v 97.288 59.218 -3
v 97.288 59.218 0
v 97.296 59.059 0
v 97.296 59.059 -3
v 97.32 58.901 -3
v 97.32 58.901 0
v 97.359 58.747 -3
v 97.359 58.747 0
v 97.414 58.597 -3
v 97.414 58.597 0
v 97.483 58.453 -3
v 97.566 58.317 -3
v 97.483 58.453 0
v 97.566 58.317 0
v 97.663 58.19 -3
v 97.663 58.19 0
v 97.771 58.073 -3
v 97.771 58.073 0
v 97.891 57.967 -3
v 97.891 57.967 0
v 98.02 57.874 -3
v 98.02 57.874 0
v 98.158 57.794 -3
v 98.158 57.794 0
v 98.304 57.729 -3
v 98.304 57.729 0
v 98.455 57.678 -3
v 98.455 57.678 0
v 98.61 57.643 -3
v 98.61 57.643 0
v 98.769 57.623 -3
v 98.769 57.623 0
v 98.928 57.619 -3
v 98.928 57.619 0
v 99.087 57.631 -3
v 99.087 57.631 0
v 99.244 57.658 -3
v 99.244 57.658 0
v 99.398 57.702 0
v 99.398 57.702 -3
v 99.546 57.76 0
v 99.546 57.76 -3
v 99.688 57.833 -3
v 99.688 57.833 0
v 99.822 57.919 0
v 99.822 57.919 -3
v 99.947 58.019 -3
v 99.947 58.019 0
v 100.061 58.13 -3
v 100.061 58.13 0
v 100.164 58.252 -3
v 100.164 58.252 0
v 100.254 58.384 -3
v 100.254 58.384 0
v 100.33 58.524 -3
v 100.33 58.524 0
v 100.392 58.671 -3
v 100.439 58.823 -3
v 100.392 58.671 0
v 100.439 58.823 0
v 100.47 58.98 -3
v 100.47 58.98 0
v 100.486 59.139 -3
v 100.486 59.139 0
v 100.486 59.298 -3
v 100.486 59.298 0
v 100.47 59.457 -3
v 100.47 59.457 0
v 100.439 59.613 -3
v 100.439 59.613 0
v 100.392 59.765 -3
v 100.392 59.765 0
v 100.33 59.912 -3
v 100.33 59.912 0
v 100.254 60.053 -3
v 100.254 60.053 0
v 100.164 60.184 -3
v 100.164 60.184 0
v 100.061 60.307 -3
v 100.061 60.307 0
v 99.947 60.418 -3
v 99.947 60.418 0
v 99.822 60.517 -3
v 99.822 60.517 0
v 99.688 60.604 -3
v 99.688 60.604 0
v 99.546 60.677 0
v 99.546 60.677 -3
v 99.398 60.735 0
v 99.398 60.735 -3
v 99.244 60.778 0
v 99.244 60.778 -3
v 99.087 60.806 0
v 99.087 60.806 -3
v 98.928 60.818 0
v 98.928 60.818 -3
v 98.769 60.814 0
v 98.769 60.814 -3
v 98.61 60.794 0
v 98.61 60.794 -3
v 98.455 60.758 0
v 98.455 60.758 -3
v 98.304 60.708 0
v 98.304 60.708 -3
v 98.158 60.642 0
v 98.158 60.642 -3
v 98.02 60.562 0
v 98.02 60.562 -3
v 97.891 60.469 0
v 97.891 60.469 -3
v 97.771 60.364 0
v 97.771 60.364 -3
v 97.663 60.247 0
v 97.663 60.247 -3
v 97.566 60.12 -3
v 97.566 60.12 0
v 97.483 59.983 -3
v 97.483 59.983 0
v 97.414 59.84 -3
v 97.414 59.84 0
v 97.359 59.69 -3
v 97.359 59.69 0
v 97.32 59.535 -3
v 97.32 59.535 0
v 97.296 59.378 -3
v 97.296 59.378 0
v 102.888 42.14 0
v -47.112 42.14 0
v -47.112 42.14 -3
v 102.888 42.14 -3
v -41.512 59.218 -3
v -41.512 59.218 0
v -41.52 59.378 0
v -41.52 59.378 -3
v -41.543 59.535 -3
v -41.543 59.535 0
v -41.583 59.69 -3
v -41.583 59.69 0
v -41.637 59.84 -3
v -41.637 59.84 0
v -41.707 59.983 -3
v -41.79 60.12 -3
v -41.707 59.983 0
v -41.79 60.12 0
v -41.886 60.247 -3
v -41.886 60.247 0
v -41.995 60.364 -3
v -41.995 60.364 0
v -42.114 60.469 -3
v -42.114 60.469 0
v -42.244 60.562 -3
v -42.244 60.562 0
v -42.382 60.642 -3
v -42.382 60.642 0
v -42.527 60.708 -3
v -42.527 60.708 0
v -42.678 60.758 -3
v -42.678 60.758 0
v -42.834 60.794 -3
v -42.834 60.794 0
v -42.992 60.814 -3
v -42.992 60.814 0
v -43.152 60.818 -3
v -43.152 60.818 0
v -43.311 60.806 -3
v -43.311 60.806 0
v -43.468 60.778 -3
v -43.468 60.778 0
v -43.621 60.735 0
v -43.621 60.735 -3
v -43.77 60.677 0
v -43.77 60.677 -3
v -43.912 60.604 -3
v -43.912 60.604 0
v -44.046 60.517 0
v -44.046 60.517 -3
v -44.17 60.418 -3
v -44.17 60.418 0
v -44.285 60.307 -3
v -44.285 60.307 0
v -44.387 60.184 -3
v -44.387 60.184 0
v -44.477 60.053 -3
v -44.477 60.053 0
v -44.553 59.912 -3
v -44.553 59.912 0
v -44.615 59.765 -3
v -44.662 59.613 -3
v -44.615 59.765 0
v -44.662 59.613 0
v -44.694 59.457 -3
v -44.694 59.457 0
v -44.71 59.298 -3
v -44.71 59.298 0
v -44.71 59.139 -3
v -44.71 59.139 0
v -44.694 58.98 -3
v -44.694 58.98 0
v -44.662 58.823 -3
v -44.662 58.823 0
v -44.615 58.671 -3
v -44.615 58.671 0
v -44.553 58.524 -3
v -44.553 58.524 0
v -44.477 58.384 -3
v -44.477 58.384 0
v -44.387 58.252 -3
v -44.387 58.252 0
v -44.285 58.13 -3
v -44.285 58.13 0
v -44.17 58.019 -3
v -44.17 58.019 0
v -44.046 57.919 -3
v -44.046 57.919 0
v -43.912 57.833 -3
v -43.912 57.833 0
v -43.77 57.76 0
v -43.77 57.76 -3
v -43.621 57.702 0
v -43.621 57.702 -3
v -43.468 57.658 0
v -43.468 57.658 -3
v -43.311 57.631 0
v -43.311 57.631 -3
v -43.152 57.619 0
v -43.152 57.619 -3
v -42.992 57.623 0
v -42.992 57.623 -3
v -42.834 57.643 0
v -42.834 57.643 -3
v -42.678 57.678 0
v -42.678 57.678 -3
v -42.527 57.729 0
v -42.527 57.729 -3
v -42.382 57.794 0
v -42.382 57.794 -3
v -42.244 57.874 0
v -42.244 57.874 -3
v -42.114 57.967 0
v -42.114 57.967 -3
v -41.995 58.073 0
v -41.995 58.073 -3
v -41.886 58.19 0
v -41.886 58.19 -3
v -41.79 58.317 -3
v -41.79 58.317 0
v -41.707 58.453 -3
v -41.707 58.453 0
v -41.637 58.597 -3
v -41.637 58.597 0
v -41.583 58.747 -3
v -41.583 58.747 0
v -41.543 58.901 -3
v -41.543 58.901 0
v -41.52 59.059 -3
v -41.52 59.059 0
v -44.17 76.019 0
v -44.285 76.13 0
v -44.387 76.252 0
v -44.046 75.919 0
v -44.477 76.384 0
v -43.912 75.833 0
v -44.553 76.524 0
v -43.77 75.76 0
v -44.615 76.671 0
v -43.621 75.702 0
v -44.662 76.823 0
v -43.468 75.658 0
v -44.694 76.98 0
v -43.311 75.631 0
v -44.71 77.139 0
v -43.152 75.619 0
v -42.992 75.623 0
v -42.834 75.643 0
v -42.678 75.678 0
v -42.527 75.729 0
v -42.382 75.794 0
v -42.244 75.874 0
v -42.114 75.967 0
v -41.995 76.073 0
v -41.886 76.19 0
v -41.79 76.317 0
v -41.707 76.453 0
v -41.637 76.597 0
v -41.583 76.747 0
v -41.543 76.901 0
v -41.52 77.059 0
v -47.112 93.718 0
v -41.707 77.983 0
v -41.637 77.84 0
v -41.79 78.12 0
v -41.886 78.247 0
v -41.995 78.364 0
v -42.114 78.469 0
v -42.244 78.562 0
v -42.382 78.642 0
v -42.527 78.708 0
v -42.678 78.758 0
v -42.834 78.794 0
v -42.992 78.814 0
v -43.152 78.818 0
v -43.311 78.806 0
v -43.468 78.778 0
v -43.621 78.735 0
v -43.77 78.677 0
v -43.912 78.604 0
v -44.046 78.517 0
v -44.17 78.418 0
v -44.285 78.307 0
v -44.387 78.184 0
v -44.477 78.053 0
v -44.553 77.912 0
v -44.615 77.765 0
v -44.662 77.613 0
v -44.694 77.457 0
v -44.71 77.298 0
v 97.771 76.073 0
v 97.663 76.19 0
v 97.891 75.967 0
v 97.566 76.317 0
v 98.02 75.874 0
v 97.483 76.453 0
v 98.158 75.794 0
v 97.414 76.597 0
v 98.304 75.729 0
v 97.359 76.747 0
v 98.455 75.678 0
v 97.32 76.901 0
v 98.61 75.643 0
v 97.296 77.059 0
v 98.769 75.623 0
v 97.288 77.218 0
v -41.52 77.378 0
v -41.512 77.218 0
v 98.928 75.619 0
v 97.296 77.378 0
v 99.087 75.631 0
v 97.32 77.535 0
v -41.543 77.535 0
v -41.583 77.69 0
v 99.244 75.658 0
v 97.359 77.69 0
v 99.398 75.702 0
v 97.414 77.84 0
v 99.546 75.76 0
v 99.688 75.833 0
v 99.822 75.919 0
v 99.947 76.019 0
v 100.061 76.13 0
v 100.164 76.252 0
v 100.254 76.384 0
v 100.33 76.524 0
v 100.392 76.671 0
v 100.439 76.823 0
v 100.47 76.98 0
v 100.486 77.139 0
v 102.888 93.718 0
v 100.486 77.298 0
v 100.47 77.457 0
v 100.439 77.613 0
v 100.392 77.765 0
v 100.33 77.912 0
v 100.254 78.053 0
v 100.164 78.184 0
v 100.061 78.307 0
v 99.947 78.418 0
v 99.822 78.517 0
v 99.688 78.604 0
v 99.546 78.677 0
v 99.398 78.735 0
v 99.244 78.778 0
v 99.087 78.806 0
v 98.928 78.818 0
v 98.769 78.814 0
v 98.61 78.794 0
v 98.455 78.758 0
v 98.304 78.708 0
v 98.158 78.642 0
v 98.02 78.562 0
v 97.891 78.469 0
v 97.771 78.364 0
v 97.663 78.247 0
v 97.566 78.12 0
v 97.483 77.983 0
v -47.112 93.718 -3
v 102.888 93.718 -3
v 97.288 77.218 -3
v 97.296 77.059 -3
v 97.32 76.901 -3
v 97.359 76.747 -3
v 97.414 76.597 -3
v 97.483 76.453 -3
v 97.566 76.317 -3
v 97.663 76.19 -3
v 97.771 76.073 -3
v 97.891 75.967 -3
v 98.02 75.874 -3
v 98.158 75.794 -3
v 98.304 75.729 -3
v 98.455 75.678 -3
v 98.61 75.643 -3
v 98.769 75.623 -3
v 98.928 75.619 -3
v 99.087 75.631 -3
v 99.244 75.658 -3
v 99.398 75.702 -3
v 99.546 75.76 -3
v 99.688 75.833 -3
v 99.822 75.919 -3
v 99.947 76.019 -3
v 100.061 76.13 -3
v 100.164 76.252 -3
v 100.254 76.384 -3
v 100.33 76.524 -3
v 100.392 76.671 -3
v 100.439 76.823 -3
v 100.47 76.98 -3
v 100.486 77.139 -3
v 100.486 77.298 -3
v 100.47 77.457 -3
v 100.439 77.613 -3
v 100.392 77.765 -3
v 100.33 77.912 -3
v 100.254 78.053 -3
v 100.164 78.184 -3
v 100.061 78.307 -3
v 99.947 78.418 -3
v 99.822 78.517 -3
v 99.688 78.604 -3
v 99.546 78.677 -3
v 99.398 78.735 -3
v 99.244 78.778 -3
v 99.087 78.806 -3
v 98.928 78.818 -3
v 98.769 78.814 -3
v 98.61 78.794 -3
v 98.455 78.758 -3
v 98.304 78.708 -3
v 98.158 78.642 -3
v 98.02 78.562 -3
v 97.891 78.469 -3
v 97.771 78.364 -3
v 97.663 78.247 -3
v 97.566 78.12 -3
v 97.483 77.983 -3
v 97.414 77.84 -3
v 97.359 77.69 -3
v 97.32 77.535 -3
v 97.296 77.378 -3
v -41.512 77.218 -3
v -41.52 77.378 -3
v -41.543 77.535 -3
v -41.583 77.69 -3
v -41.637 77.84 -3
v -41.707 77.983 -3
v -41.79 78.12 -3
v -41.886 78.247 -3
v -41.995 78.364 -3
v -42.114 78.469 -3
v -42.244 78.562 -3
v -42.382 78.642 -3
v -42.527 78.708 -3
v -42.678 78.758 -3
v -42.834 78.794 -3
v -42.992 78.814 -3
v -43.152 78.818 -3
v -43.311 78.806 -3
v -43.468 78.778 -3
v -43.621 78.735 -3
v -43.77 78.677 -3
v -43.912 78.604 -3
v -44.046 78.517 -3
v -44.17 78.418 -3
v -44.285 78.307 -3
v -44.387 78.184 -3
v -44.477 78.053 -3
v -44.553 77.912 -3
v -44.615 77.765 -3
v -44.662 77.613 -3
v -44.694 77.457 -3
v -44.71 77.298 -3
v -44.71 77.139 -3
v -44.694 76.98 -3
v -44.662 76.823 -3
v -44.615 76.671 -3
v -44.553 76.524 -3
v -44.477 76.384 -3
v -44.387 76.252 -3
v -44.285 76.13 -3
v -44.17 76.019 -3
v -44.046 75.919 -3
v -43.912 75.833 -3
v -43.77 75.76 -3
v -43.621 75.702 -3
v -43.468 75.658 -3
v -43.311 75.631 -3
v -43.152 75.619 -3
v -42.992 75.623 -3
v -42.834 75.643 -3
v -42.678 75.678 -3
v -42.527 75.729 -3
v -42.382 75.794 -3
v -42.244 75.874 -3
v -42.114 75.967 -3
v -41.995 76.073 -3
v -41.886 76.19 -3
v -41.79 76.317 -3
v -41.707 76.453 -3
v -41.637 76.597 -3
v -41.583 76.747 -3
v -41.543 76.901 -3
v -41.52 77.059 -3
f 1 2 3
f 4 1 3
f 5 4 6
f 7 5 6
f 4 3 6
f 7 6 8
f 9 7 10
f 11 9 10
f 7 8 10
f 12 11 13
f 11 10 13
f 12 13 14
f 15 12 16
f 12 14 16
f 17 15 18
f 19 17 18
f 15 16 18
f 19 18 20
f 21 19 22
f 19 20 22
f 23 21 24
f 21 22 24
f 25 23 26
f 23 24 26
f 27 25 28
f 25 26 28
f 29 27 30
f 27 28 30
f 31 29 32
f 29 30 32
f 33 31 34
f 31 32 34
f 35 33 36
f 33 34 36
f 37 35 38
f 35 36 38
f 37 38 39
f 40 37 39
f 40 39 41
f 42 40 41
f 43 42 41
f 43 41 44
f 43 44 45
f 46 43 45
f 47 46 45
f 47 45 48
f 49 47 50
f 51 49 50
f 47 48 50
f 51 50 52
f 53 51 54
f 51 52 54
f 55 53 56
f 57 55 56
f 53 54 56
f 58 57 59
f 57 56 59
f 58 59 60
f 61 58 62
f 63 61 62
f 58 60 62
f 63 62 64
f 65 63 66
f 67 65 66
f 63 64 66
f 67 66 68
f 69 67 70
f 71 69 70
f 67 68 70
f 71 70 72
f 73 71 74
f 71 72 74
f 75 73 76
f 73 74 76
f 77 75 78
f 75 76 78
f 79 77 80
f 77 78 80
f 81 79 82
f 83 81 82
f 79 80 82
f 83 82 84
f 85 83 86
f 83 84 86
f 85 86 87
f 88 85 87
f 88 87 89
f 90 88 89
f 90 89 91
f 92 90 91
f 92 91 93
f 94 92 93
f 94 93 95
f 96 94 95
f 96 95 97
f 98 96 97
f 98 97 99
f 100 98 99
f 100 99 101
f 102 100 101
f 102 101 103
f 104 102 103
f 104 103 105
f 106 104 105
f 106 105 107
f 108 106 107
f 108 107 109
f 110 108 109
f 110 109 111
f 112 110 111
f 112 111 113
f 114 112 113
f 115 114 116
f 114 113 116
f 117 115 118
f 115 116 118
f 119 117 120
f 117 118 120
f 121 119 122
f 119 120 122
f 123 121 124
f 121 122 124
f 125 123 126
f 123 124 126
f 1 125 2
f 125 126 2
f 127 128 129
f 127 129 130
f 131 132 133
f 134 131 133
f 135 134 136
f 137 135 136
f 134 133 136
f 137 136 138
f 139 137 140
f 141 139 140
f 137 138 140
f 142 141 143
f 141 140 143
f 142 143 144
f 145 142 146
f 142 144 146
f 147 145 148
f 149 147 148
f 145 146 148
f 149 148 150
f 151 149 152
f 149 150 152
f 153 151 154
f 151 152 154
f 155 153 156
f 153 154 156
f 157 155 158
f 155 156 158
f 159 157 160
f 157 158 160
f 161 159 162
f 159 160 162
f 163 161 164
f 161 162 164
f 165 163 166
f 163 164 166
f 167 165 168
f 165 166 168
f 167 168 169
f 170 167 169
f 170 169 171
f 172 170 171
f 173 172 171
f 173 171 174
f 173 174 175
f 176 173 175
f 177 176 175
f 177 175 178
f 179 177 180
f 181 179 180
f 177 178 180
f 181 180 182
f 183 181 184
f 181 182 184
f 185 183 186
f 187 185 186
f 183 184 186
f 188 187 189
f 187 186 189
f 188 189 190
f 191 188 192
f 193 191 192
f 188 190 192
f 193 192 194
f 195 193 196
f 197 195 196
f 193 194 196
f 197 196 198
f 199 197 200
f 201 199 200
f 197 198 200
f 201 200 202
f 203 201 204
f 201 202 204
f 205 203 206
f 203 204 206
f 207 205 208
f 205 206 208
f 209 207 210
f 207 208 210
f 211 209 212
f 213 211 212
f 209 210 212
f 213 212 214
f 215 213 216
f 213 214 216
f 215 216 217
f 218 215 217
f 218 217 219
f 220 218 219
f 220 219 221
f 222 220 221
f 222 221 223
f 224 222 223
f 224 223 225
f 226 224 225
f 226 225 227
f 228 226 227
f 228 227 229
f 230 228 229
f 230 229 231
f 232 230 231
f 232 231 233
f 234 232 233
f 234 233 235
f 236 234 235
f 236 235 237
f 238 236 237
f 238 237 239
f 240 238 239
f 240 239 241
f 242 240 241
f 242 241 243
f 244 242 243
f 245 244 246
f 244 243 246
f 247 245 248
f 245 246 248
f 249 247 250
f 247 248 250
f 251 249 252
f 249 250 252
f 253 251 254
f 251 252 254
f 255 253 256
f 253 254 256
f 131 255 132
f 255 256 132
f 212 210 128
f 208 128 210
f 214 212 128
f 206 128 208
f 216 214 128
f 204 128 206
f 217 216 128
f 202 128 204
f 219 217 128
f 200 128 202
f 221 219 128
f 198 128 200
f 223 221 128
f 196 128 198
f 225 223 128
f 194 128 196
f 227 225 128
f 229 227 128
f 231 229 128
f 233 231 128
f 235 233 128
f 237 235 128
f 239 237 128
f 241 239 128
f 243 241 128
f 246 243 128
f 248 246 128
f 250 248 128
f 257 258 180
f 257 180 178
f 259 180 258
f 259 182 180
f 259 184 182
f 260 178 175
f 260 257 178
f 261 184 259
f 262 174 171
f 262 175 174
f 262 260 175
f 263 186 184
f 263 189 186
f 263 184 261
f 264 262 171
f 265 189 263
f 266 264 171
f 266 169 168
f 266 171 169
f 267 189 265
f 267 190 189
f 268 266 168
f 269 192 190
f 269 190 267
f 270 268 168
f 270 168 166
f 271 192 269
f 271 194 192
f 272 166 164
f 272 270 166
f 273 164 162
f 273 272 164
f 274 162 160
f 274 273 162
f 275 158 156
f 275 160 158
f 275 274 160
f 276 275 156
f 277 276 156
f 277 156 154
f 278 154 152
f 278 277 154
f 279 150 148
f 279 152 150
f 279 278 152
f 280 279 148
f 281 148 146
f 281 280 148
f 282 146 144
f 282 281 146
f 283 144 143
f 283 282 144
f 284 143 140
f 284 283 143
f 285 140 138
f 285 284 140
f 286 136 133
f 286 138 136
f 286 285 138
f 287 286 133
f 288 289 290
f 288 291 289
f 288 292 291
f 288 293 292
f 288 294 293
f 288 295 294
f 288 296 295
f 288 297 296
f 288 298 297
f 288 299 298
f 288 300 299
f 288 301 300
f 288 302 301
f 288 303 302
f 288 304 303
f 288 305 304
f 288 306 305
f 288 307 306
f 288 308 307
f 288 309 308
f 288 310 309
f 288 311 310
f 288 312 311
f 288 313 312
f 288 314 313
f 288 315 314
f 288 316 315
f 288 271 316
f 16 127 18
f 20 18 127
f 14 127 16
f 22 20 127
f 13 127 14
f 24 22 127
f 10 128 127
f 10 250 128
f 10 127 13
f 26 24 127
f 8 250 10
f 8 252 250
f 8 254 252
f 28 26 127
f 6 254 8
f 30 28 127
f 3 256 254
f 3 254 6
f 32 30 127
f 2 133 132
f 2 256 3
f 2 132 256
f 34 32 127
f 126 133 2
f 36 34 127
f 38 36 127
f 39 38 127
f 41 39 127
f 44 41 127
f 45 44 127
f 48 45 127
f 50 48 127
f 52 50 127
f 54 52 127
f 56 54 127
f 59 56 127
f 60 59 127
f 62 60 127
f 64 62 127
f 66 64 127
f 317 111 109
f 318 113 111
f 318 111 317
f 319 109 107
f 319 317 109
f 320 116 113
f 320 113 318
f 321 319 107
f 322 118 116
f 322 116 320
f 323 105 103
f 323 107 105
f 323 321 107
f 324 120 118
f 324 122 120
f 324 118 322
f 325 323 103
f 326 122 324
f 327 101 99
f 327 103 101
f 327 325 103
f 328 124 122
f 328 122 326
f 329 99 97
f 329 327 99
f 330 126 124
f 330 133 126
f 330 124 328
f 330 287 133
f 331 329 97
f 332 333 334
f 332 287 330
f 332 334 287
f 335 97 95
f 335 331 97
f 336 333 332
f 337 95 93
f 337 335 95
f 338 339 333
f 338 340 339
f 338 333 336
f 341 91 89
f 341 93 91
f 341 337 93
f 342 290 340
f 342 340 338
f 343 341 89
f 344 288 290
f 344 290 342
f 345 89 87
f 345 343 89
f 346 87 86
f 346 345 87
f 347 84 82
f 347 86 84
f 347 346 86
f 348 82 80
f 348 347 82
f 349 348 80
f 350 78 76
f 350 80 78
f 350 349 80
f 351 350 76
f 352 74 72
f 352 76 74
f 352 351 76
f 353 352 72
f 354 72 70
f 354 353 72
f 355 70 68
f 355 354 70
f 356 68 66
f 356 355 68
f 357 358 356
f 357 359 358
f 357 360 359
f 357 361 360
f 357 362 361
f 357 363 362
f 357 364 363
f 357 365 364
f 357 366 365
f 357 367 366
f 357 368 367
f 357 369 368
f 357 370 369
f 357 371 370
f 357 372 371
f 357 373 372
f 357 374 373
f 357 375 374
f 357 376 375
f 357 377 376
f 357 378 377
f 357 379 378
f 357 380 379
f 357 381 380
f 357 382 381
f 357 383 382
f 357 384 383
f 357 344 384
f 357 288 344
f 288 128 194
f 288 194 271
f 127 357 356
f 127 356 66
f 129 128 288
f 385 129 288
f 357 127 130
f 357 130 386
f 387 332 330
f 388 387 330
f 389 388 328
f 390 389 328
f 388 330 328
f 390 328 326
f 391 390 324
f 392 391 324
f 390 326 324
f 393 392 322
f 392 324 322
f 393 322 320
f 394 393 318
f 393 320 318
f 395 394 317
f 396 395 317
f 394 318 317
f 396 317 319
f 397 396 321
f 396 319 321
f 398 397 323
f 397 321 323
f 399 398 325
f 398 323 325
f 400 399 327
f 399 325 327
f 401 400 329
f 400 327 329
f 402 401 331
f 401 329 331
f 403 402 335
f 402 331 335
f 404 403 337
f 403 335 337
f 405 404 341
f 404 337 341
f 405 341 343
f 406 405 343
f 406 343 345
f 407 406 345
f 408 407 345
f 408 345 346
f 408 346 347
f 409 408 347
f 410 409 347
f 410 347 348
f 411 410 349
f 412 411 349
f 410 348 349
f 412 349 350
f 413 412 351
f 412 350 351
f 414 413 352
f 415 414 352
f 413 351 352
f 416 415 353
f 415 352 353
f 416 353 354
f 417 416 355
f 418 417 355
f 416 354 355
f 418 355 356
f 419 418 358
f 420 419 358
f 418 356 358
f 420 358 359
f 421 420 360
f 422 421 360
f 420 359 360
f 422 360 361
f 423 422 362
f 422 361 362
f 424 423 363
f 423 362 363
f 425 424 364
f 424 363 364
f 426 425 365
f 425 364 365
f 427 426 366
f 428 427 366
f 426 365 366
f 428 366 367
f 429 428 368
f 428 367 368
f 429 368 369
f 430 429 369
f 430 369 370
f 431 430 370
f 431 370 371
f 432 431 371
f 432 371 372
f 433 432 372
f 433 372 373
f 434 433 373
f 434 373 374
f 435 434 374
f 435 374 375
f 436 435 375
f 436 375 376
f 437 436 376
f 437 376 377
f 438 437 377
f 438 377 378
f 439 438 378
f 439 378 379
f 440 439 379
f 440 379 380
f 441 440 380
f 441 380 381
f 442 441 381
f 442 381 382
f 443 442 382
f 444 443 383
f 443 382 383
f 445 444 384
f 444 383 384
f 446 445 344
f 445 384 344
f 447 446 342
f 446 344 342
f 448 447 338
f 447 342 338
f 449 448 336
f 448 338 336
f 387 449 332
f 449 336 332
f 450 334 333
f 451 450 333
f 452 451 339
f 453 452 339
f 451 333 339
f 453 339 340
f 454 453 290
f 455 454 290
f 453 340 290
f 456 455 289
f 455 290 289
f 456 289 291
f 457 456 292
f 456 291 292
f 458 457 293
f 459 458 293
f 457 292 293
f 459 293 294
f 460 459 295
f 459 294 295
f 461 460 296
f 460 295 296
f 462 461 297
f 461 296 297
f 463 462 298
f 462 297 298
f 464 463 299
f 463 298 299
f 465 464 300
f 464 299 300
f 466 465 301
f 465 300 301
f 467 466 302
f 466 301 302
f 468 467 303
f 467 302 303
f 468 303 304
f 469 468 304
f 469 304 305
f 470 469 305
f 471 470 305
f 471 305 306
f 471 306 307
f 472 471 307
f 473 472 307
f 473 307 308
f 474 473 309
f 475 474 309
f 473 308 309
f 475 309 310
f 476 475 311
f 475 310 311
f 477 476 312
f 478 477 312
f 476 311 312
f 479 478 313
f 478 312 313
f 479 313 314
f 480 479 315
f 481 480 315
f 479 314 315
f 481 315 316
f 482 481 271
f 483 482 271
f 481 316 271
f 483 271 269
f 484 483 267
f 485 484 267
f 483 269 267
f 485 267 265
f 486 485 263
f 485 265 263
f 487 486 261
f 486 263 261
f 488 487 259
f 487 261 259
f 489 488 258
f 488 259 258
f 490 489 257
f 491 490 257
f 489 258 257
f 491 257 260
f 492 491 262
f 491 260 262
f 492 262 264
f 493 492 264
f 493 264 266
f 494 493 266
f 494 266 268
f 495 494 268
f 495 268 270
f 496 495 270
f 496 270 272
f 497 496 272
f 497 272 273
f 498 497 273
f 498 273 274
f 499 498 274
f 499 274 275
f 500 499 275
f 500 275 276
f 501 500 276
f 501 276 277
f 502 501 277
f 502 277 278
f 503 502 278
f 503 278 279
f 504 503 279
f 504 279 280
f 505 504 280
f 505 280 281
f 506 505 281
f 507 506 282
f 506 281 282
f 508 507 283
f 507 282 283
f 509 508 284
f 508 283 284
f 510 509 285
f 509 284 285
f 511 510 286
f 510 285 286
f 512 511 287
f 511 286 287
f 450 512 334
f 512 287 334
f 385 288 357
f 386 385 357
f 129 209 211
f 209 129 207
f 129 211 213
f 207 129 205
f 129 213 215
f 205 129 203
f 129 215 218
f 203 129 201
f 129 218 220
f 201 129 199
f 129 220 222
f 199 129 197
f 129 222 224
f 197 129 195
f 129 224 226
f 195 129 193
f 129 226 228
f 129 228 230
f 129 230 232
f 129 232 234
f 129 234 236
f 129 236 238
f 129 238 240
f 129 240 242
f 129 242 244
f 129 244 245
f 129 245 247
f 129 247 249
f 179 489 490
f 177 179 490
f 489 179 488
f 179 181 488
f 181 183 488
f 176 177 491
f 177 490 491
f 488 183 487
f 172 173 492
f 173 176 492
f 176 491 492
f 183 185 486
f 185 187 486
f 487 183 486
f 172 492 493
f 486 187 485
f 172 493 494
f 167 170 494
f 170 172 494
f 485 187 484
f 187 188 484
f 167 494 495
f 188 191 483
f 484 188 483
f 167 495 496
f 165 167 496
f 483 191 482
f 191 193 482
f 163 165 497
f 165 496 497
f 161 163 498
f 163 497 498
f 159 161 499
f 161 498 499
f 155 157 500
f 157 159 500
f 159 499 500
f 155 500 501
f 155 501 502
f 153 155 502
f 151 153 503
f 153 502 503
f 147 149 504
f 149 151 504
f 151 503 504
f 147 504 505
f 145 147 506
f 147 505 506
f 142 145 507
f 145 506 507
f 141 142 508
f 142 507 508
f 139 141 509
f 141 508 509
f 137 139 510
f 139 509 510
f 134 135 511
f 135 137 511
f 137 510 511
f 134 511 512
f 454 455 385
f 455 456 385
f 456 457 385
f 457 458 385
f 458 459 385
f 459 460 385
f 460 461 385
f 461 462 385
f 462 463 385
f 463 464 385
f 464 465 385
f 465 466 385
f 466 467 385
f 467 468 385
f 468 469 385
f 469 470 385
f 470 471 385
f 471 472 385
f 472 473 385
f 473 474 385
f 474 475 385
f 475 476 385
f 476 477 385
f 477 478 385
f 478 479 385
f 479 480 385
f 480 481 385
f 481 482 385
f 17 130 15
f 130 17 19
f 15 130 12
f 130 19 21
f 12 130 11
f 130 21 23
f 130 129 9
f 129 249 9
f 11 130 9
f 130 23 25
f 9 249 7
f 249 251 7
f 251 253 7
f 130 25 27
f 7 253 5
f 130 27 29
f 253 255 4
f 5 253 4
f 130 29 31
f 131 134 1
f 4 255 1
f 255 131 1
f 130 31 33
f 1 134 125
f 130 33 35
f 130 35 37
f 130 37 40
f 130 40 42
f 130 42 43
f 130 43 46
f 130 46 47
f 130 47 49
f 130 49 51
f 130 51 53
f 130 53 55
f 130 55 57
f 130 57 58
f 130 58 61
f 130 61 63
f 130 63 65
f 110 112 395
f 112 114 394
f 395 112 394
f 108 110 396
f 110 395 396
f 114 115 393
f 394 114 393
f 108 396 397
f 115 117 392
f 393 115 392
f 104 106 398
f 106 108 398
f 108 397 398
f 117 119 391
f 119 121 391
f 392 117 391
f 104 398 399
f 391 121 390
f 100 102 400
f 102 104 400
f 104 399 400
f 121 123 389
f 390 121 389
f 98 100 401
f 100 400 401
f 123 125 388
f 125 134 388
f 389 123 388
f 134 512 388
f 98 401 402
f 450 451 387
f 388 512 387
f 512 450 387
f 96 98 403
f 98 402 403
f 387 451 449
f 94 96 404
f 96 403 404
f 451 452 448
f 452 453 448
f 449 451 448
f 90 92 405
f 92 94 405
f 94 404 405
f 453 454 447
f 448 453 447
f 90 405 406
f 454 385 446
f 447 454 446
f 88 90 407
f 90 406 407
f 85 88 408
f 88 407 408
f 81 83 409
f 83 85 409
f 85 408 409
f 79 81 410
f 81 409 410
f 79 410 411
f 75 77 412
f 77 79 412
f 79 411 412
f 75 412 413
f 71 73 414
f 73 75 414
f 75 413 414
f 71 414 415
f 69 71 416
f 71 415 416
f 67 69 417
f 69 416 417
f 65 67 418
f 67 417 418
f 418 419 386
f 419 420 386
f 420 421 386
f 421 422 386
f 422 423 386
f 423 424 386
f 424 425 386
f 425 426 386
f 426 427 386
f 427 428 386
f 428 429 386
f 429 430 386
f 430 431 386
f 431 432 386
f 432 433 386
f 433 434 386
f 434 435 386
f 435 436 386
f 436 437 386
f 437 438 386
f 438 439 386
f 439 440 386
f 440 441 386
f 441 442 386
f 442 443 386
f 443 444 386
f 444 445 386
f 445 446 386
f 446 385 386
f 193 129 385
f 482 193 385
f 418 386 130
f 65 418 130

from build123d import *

# Parameters (mm, degrees)
SKETCH_1_W      = 150
SKETCH_1_H      = 51.578516668
SKETCH_1_R      = 1.6
EXTRUDE_1_DEPTH = 3


with BuildPart() as part:
    # 草图1 → 凸台-拉伸1 (new body)
    with BuildSketch(Plane.XY):
        with Locations((27.888283405, 67.928998275)):
            Rectangle(SKETCH_1_W, SKETCH_1_H)
        with Locations((-43.111716595, 77.218256609)):
            Circle(SKETCH_1_R, mode=Mode.SUBTRACT)
        with Locations((-43.111716595, 59.218256609)):
            Circle(SKETCH_1_R, mode=Mode.SUBTRACT)
        with Locations(Location((98.888283405, 59.218256609, 0), (0, 0, 180))):
            Circle(SKETCH_1_R, mode=Mode.SUBTRACT)
        with Locations(Location((98.888283405, 77.218256609, 0), (0, 0, 180))):
            Circle(SKETCH_1_R, mode=Mode.SUBTRACT)
    extrude(amount=-EXTRUDE_1_DEPTH)


solid = part.part
